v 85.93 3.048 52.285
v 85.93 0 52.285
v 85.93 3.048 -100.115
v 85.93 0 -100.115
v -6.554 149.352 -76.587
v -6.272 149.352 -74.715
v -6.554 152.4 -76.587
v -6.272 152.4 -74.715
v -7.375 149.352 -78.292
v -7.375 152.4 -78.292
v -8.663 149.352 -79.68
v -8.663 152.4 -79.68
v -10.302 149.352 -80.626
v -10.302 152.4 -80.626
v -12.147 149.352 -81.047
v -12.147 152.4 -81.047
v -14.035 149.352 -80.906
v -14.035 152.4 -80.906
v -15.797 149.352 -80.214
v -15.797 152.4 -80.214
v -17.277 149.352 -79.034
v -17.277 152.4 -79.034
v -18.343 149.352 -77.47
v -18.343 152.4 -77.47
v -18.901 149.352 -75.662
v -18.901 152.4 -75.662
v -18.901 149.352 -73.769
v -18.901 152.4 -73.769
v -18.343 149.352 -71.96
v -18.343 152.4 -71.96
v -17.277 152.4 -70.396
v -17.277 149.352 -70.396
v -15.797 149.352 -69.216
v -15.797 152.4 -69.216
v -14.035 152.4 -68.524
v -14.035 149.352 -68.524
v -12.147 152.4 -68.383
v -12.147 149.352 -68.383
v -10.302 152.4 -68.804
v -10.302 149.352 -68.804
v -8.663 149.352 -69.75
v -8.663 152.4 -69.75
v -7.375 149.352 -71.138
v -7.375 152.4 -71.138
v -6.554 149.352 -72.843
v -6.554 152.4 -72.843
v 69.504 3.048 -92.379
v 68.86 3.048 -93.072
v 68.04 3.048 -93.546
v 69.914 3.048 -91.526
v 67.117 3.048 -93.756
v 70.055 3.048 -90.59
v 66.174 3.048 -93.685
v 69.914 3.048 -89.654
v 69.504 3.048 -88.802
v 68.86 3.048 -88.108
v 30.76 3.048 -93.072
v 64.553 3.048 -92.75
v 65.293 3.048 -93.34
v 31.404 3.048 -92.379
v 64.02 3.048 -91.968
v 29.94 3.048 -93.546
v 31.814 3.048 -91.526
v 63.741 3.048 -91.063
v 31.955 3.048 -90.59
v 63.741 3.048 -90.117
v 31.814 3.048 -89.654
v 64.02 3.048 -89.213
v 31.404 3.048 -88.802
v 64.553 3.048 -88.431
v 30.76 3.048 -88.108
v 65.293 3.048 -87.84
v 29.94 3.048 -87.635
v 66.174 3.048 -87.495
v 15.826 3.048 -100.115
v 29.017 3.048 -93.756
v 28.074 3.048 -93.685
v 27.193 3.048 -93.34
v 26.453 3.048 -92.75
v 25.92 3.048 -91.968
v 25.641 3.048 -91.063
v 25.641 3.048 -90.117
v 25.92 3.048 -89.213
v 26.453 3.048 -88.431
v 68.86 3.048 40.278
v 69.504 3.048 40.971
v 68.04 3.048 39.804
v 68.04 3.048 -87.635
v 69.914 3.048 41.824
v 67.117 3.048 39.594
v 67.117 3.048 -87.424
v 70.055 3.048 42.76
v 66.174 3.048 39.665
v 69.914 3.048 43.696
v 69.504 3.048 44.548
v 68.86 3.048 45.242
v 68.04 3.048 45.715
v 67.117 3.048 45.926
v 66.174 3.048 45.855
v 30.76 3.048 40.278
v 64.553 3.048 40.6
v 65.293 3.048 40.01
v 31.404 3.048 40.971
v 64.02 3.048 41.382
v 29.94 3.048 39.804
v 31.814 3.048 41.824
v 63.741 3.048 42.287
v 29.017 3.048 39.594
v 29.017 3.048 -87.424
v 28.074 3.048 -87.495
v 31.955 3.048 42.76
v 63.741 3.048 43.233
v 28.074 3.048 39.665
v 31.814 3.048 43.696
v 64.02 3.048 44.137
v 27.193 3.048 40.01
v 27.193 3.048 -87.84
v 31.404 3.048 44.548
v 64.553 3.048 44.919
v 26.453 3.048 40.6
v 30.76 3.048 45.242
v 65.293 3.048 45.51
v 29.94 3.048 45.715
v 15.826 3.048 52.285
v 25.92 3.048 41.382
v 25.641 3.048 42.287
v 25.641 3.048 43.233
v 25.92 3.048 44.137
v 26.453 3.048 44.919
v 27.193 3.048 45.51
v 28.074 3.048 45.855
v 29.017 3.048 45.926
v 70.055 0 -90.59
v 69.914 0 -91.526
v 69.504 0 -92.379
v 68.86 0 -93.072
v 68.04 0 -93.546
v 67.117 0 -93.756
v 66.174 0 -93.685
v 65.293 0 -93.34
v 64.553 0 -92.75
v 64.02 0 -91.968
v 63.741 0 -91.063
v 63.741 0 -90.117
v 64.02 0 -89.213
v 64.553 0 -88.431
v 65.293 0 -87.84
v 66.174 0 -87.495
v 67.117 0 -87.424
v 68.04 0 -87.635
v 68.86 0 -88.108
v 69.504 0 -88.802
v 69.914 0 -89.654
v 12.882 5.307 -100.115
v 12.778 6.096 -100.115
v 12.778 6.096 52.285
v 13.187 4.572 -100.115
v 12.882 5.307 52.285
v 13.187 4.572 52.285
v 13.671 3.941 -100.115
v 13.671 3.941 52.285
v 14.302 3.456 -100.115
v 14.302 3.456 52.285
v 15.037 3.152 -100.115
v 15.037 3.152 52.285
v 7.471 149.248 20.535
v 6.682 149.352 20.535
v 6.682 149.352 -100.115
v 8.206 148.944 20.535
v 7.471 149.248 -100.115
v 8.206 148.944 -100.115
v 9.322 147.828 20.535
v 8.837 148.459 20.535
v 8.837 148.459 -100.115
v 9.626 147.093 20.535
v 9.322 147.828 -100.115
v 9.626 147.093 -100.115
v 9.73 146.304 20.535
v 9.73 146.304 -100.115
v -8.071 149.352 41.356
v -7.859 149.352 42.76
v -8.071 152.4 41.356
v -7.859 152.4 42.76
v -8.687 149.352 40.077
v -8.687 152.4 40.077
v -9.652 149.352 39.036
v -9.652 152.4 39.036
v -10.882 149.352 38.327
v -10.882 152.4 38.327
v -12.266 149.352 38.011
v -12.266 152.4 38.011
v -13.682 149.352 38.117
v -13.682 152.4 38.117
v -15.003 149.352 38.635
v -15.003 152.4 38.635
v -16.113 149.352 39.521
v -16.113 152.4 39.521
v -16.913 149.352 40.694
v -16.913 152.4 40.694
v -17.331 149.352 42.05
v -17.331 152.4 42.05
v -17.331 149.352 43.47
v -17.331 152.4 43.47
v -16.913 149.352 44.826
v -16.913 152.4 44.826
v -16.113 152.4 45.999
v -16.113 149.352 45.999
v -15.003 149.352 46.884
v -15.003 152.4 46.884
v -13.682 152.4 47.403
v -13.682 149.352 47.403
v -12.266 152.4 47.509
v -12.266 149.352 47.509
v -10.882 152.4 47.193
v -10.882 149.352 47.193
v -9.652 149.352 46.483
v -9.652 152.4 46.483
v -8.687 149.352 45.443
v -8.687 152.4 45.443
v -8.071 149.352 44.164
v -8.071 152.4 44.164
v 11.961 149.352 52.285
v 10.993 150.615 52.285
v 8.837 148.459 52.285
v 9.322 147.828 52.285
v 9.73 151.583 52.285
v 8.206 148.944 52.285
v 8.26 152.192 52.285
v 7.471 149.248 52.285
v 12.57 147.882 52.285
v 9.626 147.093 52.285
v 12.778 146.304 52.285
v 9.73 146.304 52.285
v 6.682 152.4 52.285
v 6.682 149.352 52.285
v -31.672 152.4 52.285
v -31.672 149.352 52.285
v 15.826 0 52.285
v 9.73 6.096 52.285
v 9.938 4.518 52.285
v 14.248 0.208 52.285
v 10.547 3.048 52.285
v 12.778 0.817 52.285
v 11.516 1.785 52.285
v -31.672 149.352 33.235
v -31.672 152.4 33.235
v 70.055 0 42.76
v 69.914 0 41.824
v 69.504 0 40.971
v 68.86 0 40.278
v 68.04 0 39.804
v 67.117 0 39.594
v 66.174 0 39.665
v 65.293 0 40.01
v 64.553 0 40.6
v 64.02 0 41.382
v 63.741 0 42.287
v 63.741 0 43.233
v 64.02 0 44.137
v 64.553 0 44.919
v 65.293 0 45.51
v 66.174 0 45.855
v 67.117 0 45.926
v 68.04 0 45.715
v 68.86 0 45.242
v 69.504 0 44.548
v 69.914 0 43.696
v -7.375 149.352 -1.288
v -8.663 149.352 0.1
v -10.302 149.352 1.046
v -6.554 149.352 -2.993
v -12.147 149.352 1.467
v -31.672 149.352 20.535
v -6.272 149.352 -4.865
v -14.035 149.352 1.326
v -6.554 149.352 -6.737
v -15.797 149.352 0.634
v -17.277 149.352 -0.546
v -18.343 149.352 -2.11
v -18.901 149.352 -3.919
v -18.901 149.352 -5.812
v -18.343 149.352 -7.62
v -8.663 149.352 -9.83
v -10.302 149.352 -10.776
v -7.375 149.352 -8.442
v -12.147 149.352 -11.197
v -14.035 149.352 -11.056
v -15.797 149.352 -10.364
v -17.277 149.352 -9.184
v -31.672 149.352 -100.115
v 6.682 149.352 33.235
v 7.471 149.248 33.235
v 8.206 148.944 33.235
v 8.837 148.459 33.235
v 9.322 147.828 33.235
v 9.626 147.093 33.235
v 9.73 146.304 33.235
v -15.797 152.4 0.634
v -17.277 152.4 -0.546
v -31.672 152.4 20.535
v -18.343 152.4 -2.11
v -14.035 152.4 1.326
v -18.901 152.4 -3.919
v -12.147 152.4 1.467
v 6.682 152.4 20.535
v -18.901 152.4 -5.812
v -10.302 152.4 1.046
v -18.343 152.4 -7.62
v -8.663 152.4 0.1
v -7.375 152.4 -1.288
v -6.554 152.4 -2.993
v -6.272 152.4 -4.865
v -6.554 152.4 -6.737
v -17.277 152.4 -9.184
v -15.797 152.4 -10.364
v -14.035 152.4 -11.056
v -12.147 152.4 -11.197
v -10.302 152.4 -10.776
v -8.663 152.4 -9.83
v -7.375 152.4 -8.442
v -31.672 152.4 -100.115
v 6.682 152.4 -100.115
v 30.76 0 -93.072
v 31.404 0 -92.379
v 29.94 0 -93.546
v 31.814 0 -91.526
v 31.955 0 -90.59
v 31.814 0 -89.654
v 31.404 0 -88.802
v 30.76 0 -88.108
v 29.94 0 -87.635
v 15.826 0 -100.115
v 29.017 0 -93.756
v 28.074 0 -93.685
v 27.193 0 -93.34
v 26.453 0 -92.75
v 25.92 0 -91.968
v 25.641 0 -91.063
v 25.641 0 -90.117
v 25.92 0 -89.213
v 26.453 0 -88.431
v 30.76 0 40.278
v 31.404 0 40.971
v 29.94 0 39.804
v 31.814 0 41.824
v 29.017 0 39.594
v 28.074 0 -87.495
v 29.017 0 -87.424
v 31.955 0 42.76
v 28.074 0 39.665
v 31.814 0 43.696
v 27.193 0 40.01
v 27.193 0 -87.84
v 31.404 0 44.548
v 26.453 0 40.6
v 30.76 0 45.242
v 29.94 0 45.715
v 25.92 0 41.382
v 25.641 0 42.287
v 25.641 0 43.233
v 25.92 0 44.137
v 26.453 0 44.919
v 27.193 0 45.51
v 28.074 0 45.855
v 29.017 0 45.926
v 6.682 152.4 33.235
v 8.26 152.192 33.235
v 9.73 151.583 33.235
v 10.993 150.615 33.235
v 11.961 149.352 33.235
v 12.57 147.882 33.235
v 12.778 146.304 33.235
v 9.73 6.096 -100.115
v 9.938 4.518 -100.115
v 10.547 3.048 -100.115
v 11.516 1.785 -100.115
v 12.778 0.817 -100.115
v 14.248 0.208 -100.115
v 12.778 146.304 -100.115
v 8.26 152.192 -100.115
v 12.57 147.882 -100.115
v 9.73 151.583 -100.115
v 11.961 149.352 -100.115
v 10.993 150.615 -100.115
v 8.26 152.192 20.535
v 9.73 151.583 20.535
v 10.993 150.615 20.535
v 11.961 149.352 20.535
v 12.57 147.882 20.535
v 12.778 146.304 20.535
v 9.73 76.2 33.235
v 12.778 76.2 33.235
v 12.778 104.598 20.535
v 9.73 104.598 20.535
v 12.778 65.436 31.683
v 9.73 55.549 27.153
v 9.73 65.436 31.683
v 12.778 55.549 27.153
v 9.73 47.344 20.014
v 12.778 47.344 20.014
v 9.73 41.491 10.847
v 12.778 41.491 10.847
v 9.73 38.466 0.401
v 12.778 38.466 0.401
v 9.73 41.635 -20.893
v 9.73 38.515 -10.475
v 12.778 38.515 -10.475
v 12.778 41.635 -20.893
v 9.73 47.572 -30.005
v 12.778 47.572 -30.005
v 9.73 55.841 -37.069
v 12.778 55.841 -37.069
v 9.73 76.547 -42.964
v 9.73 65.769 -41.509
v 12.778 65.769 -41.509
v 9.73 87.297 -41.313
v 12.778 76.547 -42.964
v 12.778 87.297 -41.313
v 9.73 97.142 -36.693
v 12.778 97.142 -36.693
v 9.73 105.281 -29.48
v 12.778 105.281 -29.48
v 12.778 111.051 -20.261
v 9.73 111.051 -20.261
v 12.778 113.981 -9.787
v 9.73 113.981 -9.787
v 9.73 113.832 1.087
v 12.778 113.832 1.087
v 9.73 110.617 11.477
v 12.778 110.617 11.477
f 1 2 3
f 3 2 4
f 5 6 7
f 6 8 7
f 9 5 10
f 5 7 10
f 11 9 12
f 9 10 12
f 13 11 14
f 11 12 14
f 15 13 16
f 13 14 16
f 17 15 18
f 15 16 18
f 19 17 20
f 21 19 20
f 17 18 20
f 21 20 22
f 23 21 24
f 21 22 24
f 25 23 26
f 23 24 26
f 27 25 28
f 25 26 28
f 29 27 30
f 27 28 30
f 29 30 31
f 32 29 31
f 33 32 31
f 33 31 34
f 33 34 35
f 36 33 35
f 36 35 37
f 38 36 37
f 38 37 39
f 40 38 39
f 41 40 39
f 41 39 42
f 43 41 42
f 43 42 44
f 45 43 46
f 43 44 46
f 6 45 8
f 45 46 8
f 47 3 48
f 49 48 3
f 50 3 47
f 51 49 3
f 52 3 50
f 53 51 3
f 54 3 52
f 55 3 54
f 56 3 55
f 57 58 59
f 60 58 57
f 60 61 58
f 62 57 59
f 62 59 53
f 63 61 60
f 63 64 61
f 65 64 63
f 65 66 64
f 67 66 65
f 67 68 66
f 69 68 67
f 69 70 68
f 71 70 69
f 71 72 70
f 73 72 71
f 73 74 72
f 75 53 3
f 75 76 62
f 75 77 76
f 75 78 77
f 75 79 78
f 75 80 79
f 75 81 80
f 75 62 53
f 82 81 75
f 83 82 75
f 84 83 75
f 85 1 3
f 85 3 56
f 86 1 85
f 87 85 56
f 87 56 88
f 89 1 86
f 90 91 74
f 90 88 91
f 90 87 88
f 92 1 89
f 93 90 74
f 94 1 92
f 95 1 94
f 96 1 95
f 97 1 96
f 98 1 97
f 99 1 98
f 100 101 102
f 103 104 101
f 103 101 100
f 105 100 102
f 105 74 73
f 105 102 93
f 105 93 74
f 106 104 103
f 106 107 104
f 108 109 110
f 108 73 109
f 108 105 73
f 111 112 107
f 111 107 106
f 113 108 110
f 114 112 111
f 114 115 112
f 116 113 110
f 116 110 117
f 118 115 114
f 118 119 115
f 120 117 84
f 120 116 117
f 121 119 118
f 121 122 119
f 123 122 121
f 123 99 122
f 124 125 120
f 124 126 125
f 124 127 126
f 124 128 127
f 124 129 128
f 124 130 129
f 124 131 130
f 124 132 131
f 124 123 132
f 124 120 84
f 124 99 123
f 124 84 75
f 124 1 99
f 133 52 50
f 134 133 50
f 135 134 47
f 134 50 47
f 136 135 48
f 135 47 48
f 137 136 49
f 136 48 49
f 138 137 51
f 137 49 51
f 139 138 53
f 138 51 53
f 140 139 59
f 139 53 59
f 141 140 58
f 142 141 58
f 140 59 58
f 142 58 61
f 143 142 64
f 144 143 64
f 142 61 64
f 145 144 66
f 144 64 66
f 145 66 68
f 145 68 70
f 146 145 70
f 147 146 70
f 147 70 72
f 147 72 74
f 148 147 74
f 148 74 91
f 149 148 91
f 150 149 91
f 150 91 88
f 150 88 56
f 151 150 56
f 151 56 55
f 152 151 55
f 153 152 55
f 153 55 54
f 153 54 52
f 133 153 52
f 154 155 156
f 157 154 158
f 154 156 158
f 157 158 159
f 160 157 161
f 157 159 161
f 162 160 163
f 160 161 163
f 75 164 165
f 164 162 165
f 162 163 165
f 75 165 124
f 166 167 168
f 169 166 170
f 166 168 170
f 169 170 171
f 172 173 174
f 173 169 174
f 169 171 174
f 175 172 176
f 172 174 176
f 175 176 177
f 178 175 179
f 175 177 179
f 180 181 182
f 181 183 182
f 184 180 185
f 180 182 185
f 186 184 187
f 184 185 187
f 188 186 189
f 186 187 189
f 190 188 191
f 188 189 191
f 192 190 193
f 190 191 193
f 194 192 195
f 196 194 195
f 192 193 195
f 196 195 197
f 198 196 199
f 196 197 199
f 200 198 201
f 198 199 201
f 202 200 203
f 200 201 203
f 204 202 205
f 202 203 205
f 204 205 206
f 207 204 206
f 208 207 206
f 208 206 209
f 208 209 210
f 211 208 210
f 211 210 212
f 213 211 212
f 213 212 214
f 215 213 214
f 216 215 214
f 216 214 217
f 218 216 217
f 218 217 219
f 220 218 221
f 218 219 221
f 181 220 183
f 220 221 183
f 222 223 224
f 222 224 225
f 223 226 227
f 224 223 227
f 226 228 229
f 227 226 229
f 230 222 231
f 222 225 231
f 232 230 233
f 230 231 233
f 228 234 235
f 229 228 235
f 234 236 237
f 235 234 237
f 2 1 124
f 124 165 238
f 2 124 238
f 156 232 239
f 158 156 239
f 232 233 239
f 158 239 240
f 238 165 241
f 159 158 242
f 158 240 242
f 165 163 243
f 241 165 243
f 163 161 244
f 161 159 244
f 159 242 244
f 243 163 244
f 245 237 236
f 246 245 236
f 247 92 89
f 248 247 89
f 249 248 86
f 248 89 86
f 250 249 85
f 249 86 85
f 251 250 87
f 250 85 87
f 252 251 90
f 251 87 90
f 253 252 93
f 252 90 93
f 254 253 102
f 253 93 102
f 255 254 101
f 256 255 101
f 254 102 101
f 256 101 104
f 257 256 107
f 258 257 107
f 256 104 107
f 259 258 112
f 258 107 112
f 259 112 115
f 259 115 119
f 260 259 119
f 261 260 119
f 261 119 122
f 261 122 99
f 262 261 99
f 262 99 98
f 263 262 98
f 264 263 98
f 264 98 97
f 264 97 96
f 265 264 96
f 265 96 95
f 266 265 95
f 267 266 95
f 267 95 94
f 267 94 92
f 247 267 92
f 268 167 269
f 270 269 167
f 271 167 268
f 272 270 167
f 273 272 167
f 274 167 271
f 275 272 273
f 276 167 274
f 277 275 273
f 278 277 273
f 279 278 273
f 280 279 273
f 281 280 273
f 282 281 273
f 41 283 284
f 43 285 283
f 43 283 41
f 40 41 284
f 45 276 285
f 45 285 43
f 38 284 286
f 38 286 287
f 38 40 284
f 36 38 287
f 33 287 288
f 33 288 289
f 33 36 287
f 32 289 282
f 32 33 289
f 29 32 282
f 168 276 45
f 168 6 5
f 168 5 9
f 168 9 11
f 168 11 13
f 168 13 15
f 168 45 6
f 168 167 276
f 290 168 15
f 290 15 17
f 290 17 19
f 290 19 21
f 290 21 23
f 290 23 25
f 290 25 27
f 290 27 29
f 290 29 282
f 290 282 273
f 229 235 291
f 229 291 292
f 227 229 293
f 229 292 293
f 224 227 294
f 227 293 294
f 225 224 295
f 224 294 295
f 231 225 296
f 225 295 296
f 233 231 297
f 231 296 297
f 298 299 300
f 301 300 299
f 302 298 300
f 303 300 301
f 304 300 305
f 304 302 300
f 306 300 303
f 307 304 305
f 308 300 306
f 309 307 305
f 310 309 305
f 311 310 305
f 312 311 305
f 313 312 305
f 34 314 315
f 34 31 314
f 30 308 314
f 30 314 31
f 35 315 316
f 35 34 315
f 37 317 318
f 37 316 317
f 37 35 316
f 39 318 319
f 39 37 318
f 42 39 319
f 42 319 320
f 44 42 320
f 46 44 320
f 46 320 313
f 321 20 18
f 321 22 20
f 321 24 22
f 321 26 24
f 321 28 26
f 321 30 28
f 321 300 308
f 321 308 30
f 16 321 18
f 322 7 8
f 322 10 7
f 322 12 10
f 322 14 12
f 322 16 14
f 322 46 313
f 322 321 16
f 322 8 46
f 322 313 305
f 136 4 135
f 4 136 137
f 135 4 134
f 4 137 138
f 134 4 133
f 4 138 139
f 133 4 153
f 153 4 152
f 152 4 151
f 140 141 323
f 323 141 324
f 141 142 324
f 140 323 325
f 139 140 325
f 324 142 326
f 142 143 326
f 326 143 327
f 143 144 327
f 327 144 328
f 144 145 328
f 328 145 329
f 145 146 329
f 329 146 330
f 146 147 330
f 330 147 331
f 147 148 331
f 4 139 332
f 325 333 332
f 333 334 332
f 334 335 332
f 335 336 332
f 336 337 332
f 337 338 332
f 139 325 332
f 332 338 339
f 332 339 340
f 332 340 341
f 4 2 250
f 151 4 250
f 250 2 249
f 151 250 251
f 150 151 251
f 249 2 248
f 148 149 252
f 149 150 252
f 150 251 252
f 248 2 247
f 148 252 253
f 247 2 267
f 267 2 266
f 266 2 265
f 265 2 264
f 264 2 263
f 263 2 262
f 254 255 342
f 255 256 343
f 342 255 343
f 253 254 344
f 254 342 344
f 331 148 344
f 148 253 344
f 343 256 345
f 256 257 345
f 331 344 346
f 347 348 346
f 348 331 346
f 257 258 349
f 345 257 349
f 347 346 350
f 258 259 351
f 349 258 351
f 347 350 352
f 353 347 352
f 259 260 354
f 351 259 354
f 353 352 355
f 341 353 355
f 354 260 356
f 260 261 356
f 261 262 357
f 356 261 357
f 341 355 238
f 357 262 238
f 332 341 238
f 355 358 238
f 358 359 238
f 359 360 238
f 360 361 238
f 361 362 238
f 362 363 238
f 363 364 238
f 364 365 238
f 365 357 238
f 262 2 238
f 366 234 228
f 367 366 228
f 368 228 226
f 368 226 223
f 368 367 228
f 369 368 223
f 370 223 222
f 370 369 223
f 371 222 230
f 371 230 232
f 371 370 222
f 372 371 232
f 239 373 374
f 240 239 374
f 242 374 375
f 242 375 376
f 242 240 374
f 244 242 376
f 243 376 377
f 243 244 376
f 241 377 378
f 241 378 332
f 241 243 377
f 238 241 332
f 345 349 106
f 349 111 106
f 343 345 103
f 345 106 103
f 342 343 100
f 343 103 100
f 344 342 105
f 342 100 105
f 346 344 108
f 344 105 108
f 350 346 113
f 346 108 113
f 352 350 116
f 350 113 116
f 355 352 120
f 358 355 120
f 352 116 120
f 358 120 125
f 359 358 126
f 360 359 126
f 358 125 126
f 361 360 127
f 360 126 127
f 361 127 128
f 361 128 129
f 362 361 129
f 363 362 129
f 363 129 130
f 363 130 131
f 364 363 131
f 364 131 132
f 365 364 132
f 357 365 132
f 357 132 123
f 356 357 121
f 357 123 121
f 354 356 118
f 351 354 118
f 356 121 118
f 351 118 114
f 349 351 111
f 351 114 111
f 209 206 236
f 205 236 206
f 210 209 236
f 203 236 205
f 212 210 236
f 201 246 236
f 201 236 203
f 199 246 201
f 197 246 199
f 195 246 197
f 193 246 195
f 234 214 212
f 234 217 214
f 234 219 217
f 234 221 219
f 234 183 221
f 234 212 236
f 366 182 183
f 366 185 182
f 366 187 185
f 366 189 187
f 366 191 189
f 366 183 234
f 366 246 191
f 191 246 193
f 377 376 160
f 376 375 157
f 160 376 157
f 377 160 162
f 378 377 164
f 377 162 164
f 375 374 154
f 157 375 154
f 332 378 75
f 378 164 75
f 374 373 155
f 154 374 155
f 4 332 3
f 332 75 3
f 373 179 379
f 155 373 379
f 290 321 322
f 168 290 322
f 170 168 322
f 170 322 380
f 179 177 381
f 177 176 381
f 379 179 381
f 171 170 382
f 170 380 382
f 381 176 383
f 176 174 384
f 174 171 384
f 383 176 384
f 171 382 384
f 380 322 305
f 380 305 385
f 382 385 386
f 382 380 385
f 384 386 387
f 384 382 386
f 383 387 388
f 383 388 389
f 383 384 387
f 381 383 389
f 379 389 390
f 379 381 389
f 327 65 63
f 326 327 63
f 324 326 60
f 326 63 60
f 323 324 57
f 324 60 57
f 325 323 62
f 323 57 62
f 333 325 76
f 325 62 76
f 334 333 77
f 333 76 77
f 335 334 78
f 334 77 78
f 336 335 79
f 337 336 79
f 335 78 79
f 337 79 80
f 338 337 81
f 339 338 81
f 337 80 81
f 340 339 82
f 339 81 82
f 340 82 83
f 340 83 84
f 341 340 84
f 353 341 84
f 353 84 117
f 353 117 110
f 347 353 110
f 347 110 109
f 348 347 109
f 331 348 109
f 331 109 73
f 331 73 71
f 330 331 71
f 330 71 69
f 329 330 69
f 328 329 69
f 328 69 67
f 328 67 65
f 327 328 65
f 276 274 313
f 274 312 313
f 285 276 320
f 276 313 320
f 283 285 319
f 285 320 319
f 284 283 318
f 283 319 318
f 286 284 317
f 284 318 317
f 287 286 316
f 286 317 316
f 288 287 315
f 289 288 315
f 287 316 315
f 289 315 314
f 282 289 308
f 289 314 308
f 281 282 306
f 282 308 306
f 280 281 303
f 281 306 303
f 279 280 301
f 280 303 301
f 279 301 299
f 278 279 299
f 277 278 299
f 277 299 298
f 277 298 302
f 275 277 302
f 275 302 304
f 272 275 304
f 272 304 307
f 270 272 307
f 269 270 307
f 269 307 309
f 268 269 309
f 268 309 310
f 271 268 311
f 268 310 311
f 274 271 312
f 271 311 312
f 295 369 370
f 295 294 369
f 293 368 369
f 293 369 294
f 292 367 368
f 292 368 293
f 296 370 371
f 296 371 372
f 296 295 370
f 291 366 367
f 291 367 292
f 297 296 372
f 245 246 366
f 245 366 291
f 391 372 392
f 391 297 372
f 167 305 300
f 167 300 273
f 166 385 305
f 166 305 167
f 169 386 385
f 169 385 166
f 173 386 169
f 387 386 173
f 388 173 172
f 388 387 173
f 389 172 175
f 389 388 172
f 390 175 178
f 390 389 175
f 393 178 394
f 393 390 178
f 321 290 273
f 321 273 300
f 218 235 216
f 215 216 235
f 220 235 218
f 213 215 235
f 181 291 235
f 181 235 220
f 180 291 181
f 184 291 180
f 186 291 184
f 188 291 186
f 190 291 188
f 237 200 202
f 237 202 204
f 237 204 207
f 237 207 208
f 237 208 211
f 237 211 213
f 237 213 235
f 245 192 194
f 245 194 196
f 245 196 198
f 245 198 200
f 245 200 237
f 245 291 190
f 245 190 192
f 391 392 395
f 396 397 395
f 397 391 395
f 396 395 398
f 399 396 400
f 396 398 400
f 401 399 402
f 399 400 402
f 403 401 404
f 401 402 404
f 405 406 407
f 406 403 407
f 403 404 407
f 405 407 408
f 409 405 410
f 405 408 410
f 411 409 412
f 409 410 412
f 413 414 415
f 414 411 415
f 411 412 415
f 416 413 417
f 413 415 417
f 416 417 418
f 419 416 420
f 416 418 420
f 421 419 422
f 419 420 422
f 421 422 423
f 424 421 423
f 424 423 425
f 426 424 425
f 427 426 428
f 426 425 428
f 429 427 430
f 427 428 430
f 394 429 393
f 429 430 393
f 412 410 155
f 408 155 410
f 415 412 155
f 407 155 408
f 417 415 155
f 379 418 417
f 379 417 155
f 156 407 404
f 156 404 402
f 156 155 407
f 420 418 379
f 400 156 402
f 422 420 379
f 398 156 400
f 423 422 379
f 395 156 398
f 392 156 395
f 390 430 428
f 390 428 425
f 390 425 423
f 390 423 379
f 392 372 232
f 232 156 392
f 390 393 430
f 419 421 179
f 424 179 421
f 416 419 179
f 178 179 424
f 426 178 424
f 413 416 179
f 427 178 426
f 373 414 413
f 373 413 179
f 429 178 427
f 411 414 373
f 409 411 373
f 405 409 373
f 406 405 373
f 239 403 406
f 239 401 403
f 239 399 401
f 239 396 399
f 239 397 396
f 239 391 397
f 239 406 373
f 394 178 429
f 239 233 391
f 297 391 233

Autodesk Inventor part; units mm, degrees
ref_plane "YZ Plane" through (0, 0, 0) normal (1, 0, 0) x (0, 1, 0)
ref_plane "XZ Plane" through (0, 0, 0) normal (0, 1, 0) x (-1, 0, 0)
ref_plane "XY Plane" through (0, 0, 0) normal (0, 0, 1) x (1, 0, 0)
sketch "Sketch1" plane through (0, 0, 0) normal (0, 1, 0) x (-1, 0, 0)
  line L0 (-9.7302, 52.2849) -> (-85.9302, 52.2849)
  line L1 (-85.9302, 52.2849) -> (-85.9302, -100.1151)
  line L2 (-85.9302, -100.1151) -> (-9.7302, -100.1151)
  line L3 (-9.7302, -100.1151) -> (-9.7302, 52.2849)
  point P0 (0, 0)
  dimension "d0" = 152.4
  dimension "d1" = 76.2
extrude "Plate1" add sketch "Sketch1" along normal blind 3.048
sketch "Sketch2" plane through (12.7782, 0, 52.2849) normal (-1, 0, 0) x (0, -1, 0)
  line L0 (0, -152.4) -> (0, 0)
  line L1 (0, 0) -> (-152.4, 0)
  line L2 (-152.4, 0) -> (-152.4, -152.4)
  line L3 (-152.4, -152.4) -> (0, -152.4)
edge flange "Flange1" height 152.4 angle 90 thickness 3.048 bend radius 3.048 thickness toward (-1, 0, 0) relief tear relief width 3.048 relief depth 1.524 edges at (9.7302, 3.048, -23.9151) wall of the first edge with corners at (12.7782, 0, -100.1151) (12.7782, 0, 52.2849) (12.7782, 152.4, 52.2849) (12.7782, 152.4, -100.1151)
bend "Bend1"
corner "Corner1"
sketch "Sketch5" plane through (12.7782, 152.4, 52.2849) normal (1, 0, 0) x (0, 0, -1)
  circle A0 centre (57.15, -76.2) radius 38.1
  line L0 (0, -152.4) -> (152.4, -152.4) projected
  line L1 (152.4, 0) -> (152.4, -146.304) projected
  point P0 (52.2849, -152.4)
  dimension "d23" = 76.2
  dimension "d24" = 76.2
  dimension "d25" = 95.25
extrude "Cut1" cut sketch "Sketch5" against normal blind 3.048
sketch "Sketch6" plane through (12.7782, 152.4, 52.2849) normal (1, 0, 0) x (0, 0, -1)
  circle A0 centre (57.15, -76.2) radius 38.1 projected
  line L0 (19.05, -76.2) -> (19.05, 0)
  line L1 (152.4, 0) -> (0, 0) projected
  line L2 (19.05, 0) -> (31.75, 0)
  line L3 (31.75, 0) -> (31.75, -47.8019)
  arc A1 (31.75, -47.8019) -> (19.05, -76.2) centre (57.15, -76.2) ccw
  point P0 (52.2849, -152.4)
  dimension "d47" = 12.7
extrude "Cut2" cut sketch "Sketch6" against normal blind 3.048 contours A0 L0 L1 L3
sketch "Sketch7" plane through (12.7782, 149.352, 33.2349) normal (0, 1, 0) x (-1, 0, 0)
  line L0 (0, 19.05) -> (0, 0)
  line L1 (0, 0) -> (44.45, 0)
  line L2 (44.45, 0) -> (44.45, 19.05)
  line L3 (44.45, 19.05) -> (0, 19.05)
edge flange "Flange3" height 44.45 angle 90 thickness 3.048 bend radius 3.048 thickness toward (0, 1, 0) relief tear relief width 3.048 relief depth 1.524 corner gap 3.048 corner form 0 edges at (9.7302, 152.4, 42.7599) (9.7302, 152.4, -39.7901) wall of the first edge with corners at (12.7782, 149.352, 52.2849) (12.7782, 149.352, 33.2349) (-31.6718, 149.352, 33.2349) (-31.6718, 149.352, 52.2849)
bend "Bend3"
corner "Corner3"
sketch "Sketch8" plane through (-31.6718, 152.4, 20.5349) normal (0, 1, 0) x (1, 0, 0)
  circle A0 centre (19.05, 95.25) radius 6.35
  circle A1 centre (19.05, 25.4) radius 6.35
  line L0 (38.354, 0) -> (0, 0) projected
  line L1 (0, 0) -> (0, 120.65) projected
  point P0 (31.6718, 20.5349)
  dimension "d40" = 12.7
  dimension "d41" = 69.85
  dimension "d42" = 25.4
  dimension "d43" = 19.05
  dimension "d44" = 19.05
extrude "Cut3" cut sketch "Sketch8" against normal blind 3.048
sketch "Sketch9" plane through (-31.6718, 152.4, 52.2849) normal (0, 1, 0) x (1, 0, 0)
  circle A0 centre (19.05, 9.525) radius 4.7625
  line L0 (38.354, 0) -> (0, 0) projected
  line L1 (0, 0) -> (0, 19.05) projected
  point P0 (31.6718, 52.2849)
  dimension "d48" = 9.525
  dimension "d49" = 9.525
  dimension "d50" = 19.05
extrude "Cut4" cut sketch "Sketch9" against normal blind 3.048
sketch "Sketch10" plane through (-31.6718, 149.352, 20.5349) normal (0, 0, 1) x (1, 0, 0)
  point P0 (31.6718, -149.352)
sketch "Sketch11" plane through (0, 3.048, 0) normal (0, 1, 0) x (1, 0, 0)
  circle A0 centre (66.8802, -42.7599) radius 3.175
  circle A1 centre (28.7802, -42.7599) radius 3.175
  line L0 (85.9302, -52.2849) -> (15.8262, -52.2849) projected
  line L1 (85.9302, 100.1151) -> (85.9302, -52.2849) projected
  circle A2 centre (66.8802, 90.5901) radius 3.175
  circle A3 centre (28.7802, 90.5901) radius 3.175
  line L2 (15.8262, 100.1151) -> (85.9302, 100.1151) projected
  point P0 (0, 0)
  dimension "d53" = 6.35
  dimension "d54" = 6.35
  dimension "d55" = 9.525
  dimension "d56" = 9.525
  dimension "d57" = 38.1
  dimension "d58" = 19.05
  dimension "d59" = 6.35
  dimension "d60" = 6.35
  dimension "d63" = 38.1
  dimension "d65" = 9.525
  dimension "d66" = 9.525
  dimension "d67" = 19.05
extrude "Cut5" cut sketch "Sketch11" against normal blind 3.048
equation "\"d26\" = Thickness"
equation "\"d28\" = Thickness"
equation "\"d45\" = Thickness"
equation "\"d51\" = Thickness"
equation "\"d68\" = Thickness"
equation "\"d3\" = BendReliefWidth"
equation "\"d4\" = BendReliefDepth"
equation "\"d5\" = MinimumRemnant"
equation "\"d6\" = BendRadius"
equation "\"d9\" = BendRadius"
equation "\"d10\" = CornerReliefSize"
equation "\"d11\" = GapSize"
equation "\"d12\" = JacobiRadiusSize"
equation "\"d30\" = BendReliefWidth"
equation "\"d31\" = BendReliefDepth"
equation "\"d32\" = MinimumRemnant"
equation "\"d33\" = BendRadius"
equation "\"d36\" = BendRadius"
equation "\"d37\" = CornerReliefSize"
equation "\"d38\" = GapSize"
equation "\"d39\" = JacobiRadiusSize"
equation "\"BendRadius\" = Thickness"
equation "\"BendReliefWidth\" = Thickness"
equation "\"BendReliefDepth\" = 0.5 * Thickness"
equation "\"CornerReliefSize\" = 4 * Thickness"
equation "\"MinimumRemnant\" = 2 * Thickness"
equation "\"TransitionRadius\" = BendRadius"
equation "\"JacobiRadiusSize\" = BendRadius"
equation "\"GapSize\" = Thickness"
equation "\"d2\" = BendRadius"
equation "\"Thickness\" = 3.048"
properties part number "Tape Measure Dispenser Part 2"
